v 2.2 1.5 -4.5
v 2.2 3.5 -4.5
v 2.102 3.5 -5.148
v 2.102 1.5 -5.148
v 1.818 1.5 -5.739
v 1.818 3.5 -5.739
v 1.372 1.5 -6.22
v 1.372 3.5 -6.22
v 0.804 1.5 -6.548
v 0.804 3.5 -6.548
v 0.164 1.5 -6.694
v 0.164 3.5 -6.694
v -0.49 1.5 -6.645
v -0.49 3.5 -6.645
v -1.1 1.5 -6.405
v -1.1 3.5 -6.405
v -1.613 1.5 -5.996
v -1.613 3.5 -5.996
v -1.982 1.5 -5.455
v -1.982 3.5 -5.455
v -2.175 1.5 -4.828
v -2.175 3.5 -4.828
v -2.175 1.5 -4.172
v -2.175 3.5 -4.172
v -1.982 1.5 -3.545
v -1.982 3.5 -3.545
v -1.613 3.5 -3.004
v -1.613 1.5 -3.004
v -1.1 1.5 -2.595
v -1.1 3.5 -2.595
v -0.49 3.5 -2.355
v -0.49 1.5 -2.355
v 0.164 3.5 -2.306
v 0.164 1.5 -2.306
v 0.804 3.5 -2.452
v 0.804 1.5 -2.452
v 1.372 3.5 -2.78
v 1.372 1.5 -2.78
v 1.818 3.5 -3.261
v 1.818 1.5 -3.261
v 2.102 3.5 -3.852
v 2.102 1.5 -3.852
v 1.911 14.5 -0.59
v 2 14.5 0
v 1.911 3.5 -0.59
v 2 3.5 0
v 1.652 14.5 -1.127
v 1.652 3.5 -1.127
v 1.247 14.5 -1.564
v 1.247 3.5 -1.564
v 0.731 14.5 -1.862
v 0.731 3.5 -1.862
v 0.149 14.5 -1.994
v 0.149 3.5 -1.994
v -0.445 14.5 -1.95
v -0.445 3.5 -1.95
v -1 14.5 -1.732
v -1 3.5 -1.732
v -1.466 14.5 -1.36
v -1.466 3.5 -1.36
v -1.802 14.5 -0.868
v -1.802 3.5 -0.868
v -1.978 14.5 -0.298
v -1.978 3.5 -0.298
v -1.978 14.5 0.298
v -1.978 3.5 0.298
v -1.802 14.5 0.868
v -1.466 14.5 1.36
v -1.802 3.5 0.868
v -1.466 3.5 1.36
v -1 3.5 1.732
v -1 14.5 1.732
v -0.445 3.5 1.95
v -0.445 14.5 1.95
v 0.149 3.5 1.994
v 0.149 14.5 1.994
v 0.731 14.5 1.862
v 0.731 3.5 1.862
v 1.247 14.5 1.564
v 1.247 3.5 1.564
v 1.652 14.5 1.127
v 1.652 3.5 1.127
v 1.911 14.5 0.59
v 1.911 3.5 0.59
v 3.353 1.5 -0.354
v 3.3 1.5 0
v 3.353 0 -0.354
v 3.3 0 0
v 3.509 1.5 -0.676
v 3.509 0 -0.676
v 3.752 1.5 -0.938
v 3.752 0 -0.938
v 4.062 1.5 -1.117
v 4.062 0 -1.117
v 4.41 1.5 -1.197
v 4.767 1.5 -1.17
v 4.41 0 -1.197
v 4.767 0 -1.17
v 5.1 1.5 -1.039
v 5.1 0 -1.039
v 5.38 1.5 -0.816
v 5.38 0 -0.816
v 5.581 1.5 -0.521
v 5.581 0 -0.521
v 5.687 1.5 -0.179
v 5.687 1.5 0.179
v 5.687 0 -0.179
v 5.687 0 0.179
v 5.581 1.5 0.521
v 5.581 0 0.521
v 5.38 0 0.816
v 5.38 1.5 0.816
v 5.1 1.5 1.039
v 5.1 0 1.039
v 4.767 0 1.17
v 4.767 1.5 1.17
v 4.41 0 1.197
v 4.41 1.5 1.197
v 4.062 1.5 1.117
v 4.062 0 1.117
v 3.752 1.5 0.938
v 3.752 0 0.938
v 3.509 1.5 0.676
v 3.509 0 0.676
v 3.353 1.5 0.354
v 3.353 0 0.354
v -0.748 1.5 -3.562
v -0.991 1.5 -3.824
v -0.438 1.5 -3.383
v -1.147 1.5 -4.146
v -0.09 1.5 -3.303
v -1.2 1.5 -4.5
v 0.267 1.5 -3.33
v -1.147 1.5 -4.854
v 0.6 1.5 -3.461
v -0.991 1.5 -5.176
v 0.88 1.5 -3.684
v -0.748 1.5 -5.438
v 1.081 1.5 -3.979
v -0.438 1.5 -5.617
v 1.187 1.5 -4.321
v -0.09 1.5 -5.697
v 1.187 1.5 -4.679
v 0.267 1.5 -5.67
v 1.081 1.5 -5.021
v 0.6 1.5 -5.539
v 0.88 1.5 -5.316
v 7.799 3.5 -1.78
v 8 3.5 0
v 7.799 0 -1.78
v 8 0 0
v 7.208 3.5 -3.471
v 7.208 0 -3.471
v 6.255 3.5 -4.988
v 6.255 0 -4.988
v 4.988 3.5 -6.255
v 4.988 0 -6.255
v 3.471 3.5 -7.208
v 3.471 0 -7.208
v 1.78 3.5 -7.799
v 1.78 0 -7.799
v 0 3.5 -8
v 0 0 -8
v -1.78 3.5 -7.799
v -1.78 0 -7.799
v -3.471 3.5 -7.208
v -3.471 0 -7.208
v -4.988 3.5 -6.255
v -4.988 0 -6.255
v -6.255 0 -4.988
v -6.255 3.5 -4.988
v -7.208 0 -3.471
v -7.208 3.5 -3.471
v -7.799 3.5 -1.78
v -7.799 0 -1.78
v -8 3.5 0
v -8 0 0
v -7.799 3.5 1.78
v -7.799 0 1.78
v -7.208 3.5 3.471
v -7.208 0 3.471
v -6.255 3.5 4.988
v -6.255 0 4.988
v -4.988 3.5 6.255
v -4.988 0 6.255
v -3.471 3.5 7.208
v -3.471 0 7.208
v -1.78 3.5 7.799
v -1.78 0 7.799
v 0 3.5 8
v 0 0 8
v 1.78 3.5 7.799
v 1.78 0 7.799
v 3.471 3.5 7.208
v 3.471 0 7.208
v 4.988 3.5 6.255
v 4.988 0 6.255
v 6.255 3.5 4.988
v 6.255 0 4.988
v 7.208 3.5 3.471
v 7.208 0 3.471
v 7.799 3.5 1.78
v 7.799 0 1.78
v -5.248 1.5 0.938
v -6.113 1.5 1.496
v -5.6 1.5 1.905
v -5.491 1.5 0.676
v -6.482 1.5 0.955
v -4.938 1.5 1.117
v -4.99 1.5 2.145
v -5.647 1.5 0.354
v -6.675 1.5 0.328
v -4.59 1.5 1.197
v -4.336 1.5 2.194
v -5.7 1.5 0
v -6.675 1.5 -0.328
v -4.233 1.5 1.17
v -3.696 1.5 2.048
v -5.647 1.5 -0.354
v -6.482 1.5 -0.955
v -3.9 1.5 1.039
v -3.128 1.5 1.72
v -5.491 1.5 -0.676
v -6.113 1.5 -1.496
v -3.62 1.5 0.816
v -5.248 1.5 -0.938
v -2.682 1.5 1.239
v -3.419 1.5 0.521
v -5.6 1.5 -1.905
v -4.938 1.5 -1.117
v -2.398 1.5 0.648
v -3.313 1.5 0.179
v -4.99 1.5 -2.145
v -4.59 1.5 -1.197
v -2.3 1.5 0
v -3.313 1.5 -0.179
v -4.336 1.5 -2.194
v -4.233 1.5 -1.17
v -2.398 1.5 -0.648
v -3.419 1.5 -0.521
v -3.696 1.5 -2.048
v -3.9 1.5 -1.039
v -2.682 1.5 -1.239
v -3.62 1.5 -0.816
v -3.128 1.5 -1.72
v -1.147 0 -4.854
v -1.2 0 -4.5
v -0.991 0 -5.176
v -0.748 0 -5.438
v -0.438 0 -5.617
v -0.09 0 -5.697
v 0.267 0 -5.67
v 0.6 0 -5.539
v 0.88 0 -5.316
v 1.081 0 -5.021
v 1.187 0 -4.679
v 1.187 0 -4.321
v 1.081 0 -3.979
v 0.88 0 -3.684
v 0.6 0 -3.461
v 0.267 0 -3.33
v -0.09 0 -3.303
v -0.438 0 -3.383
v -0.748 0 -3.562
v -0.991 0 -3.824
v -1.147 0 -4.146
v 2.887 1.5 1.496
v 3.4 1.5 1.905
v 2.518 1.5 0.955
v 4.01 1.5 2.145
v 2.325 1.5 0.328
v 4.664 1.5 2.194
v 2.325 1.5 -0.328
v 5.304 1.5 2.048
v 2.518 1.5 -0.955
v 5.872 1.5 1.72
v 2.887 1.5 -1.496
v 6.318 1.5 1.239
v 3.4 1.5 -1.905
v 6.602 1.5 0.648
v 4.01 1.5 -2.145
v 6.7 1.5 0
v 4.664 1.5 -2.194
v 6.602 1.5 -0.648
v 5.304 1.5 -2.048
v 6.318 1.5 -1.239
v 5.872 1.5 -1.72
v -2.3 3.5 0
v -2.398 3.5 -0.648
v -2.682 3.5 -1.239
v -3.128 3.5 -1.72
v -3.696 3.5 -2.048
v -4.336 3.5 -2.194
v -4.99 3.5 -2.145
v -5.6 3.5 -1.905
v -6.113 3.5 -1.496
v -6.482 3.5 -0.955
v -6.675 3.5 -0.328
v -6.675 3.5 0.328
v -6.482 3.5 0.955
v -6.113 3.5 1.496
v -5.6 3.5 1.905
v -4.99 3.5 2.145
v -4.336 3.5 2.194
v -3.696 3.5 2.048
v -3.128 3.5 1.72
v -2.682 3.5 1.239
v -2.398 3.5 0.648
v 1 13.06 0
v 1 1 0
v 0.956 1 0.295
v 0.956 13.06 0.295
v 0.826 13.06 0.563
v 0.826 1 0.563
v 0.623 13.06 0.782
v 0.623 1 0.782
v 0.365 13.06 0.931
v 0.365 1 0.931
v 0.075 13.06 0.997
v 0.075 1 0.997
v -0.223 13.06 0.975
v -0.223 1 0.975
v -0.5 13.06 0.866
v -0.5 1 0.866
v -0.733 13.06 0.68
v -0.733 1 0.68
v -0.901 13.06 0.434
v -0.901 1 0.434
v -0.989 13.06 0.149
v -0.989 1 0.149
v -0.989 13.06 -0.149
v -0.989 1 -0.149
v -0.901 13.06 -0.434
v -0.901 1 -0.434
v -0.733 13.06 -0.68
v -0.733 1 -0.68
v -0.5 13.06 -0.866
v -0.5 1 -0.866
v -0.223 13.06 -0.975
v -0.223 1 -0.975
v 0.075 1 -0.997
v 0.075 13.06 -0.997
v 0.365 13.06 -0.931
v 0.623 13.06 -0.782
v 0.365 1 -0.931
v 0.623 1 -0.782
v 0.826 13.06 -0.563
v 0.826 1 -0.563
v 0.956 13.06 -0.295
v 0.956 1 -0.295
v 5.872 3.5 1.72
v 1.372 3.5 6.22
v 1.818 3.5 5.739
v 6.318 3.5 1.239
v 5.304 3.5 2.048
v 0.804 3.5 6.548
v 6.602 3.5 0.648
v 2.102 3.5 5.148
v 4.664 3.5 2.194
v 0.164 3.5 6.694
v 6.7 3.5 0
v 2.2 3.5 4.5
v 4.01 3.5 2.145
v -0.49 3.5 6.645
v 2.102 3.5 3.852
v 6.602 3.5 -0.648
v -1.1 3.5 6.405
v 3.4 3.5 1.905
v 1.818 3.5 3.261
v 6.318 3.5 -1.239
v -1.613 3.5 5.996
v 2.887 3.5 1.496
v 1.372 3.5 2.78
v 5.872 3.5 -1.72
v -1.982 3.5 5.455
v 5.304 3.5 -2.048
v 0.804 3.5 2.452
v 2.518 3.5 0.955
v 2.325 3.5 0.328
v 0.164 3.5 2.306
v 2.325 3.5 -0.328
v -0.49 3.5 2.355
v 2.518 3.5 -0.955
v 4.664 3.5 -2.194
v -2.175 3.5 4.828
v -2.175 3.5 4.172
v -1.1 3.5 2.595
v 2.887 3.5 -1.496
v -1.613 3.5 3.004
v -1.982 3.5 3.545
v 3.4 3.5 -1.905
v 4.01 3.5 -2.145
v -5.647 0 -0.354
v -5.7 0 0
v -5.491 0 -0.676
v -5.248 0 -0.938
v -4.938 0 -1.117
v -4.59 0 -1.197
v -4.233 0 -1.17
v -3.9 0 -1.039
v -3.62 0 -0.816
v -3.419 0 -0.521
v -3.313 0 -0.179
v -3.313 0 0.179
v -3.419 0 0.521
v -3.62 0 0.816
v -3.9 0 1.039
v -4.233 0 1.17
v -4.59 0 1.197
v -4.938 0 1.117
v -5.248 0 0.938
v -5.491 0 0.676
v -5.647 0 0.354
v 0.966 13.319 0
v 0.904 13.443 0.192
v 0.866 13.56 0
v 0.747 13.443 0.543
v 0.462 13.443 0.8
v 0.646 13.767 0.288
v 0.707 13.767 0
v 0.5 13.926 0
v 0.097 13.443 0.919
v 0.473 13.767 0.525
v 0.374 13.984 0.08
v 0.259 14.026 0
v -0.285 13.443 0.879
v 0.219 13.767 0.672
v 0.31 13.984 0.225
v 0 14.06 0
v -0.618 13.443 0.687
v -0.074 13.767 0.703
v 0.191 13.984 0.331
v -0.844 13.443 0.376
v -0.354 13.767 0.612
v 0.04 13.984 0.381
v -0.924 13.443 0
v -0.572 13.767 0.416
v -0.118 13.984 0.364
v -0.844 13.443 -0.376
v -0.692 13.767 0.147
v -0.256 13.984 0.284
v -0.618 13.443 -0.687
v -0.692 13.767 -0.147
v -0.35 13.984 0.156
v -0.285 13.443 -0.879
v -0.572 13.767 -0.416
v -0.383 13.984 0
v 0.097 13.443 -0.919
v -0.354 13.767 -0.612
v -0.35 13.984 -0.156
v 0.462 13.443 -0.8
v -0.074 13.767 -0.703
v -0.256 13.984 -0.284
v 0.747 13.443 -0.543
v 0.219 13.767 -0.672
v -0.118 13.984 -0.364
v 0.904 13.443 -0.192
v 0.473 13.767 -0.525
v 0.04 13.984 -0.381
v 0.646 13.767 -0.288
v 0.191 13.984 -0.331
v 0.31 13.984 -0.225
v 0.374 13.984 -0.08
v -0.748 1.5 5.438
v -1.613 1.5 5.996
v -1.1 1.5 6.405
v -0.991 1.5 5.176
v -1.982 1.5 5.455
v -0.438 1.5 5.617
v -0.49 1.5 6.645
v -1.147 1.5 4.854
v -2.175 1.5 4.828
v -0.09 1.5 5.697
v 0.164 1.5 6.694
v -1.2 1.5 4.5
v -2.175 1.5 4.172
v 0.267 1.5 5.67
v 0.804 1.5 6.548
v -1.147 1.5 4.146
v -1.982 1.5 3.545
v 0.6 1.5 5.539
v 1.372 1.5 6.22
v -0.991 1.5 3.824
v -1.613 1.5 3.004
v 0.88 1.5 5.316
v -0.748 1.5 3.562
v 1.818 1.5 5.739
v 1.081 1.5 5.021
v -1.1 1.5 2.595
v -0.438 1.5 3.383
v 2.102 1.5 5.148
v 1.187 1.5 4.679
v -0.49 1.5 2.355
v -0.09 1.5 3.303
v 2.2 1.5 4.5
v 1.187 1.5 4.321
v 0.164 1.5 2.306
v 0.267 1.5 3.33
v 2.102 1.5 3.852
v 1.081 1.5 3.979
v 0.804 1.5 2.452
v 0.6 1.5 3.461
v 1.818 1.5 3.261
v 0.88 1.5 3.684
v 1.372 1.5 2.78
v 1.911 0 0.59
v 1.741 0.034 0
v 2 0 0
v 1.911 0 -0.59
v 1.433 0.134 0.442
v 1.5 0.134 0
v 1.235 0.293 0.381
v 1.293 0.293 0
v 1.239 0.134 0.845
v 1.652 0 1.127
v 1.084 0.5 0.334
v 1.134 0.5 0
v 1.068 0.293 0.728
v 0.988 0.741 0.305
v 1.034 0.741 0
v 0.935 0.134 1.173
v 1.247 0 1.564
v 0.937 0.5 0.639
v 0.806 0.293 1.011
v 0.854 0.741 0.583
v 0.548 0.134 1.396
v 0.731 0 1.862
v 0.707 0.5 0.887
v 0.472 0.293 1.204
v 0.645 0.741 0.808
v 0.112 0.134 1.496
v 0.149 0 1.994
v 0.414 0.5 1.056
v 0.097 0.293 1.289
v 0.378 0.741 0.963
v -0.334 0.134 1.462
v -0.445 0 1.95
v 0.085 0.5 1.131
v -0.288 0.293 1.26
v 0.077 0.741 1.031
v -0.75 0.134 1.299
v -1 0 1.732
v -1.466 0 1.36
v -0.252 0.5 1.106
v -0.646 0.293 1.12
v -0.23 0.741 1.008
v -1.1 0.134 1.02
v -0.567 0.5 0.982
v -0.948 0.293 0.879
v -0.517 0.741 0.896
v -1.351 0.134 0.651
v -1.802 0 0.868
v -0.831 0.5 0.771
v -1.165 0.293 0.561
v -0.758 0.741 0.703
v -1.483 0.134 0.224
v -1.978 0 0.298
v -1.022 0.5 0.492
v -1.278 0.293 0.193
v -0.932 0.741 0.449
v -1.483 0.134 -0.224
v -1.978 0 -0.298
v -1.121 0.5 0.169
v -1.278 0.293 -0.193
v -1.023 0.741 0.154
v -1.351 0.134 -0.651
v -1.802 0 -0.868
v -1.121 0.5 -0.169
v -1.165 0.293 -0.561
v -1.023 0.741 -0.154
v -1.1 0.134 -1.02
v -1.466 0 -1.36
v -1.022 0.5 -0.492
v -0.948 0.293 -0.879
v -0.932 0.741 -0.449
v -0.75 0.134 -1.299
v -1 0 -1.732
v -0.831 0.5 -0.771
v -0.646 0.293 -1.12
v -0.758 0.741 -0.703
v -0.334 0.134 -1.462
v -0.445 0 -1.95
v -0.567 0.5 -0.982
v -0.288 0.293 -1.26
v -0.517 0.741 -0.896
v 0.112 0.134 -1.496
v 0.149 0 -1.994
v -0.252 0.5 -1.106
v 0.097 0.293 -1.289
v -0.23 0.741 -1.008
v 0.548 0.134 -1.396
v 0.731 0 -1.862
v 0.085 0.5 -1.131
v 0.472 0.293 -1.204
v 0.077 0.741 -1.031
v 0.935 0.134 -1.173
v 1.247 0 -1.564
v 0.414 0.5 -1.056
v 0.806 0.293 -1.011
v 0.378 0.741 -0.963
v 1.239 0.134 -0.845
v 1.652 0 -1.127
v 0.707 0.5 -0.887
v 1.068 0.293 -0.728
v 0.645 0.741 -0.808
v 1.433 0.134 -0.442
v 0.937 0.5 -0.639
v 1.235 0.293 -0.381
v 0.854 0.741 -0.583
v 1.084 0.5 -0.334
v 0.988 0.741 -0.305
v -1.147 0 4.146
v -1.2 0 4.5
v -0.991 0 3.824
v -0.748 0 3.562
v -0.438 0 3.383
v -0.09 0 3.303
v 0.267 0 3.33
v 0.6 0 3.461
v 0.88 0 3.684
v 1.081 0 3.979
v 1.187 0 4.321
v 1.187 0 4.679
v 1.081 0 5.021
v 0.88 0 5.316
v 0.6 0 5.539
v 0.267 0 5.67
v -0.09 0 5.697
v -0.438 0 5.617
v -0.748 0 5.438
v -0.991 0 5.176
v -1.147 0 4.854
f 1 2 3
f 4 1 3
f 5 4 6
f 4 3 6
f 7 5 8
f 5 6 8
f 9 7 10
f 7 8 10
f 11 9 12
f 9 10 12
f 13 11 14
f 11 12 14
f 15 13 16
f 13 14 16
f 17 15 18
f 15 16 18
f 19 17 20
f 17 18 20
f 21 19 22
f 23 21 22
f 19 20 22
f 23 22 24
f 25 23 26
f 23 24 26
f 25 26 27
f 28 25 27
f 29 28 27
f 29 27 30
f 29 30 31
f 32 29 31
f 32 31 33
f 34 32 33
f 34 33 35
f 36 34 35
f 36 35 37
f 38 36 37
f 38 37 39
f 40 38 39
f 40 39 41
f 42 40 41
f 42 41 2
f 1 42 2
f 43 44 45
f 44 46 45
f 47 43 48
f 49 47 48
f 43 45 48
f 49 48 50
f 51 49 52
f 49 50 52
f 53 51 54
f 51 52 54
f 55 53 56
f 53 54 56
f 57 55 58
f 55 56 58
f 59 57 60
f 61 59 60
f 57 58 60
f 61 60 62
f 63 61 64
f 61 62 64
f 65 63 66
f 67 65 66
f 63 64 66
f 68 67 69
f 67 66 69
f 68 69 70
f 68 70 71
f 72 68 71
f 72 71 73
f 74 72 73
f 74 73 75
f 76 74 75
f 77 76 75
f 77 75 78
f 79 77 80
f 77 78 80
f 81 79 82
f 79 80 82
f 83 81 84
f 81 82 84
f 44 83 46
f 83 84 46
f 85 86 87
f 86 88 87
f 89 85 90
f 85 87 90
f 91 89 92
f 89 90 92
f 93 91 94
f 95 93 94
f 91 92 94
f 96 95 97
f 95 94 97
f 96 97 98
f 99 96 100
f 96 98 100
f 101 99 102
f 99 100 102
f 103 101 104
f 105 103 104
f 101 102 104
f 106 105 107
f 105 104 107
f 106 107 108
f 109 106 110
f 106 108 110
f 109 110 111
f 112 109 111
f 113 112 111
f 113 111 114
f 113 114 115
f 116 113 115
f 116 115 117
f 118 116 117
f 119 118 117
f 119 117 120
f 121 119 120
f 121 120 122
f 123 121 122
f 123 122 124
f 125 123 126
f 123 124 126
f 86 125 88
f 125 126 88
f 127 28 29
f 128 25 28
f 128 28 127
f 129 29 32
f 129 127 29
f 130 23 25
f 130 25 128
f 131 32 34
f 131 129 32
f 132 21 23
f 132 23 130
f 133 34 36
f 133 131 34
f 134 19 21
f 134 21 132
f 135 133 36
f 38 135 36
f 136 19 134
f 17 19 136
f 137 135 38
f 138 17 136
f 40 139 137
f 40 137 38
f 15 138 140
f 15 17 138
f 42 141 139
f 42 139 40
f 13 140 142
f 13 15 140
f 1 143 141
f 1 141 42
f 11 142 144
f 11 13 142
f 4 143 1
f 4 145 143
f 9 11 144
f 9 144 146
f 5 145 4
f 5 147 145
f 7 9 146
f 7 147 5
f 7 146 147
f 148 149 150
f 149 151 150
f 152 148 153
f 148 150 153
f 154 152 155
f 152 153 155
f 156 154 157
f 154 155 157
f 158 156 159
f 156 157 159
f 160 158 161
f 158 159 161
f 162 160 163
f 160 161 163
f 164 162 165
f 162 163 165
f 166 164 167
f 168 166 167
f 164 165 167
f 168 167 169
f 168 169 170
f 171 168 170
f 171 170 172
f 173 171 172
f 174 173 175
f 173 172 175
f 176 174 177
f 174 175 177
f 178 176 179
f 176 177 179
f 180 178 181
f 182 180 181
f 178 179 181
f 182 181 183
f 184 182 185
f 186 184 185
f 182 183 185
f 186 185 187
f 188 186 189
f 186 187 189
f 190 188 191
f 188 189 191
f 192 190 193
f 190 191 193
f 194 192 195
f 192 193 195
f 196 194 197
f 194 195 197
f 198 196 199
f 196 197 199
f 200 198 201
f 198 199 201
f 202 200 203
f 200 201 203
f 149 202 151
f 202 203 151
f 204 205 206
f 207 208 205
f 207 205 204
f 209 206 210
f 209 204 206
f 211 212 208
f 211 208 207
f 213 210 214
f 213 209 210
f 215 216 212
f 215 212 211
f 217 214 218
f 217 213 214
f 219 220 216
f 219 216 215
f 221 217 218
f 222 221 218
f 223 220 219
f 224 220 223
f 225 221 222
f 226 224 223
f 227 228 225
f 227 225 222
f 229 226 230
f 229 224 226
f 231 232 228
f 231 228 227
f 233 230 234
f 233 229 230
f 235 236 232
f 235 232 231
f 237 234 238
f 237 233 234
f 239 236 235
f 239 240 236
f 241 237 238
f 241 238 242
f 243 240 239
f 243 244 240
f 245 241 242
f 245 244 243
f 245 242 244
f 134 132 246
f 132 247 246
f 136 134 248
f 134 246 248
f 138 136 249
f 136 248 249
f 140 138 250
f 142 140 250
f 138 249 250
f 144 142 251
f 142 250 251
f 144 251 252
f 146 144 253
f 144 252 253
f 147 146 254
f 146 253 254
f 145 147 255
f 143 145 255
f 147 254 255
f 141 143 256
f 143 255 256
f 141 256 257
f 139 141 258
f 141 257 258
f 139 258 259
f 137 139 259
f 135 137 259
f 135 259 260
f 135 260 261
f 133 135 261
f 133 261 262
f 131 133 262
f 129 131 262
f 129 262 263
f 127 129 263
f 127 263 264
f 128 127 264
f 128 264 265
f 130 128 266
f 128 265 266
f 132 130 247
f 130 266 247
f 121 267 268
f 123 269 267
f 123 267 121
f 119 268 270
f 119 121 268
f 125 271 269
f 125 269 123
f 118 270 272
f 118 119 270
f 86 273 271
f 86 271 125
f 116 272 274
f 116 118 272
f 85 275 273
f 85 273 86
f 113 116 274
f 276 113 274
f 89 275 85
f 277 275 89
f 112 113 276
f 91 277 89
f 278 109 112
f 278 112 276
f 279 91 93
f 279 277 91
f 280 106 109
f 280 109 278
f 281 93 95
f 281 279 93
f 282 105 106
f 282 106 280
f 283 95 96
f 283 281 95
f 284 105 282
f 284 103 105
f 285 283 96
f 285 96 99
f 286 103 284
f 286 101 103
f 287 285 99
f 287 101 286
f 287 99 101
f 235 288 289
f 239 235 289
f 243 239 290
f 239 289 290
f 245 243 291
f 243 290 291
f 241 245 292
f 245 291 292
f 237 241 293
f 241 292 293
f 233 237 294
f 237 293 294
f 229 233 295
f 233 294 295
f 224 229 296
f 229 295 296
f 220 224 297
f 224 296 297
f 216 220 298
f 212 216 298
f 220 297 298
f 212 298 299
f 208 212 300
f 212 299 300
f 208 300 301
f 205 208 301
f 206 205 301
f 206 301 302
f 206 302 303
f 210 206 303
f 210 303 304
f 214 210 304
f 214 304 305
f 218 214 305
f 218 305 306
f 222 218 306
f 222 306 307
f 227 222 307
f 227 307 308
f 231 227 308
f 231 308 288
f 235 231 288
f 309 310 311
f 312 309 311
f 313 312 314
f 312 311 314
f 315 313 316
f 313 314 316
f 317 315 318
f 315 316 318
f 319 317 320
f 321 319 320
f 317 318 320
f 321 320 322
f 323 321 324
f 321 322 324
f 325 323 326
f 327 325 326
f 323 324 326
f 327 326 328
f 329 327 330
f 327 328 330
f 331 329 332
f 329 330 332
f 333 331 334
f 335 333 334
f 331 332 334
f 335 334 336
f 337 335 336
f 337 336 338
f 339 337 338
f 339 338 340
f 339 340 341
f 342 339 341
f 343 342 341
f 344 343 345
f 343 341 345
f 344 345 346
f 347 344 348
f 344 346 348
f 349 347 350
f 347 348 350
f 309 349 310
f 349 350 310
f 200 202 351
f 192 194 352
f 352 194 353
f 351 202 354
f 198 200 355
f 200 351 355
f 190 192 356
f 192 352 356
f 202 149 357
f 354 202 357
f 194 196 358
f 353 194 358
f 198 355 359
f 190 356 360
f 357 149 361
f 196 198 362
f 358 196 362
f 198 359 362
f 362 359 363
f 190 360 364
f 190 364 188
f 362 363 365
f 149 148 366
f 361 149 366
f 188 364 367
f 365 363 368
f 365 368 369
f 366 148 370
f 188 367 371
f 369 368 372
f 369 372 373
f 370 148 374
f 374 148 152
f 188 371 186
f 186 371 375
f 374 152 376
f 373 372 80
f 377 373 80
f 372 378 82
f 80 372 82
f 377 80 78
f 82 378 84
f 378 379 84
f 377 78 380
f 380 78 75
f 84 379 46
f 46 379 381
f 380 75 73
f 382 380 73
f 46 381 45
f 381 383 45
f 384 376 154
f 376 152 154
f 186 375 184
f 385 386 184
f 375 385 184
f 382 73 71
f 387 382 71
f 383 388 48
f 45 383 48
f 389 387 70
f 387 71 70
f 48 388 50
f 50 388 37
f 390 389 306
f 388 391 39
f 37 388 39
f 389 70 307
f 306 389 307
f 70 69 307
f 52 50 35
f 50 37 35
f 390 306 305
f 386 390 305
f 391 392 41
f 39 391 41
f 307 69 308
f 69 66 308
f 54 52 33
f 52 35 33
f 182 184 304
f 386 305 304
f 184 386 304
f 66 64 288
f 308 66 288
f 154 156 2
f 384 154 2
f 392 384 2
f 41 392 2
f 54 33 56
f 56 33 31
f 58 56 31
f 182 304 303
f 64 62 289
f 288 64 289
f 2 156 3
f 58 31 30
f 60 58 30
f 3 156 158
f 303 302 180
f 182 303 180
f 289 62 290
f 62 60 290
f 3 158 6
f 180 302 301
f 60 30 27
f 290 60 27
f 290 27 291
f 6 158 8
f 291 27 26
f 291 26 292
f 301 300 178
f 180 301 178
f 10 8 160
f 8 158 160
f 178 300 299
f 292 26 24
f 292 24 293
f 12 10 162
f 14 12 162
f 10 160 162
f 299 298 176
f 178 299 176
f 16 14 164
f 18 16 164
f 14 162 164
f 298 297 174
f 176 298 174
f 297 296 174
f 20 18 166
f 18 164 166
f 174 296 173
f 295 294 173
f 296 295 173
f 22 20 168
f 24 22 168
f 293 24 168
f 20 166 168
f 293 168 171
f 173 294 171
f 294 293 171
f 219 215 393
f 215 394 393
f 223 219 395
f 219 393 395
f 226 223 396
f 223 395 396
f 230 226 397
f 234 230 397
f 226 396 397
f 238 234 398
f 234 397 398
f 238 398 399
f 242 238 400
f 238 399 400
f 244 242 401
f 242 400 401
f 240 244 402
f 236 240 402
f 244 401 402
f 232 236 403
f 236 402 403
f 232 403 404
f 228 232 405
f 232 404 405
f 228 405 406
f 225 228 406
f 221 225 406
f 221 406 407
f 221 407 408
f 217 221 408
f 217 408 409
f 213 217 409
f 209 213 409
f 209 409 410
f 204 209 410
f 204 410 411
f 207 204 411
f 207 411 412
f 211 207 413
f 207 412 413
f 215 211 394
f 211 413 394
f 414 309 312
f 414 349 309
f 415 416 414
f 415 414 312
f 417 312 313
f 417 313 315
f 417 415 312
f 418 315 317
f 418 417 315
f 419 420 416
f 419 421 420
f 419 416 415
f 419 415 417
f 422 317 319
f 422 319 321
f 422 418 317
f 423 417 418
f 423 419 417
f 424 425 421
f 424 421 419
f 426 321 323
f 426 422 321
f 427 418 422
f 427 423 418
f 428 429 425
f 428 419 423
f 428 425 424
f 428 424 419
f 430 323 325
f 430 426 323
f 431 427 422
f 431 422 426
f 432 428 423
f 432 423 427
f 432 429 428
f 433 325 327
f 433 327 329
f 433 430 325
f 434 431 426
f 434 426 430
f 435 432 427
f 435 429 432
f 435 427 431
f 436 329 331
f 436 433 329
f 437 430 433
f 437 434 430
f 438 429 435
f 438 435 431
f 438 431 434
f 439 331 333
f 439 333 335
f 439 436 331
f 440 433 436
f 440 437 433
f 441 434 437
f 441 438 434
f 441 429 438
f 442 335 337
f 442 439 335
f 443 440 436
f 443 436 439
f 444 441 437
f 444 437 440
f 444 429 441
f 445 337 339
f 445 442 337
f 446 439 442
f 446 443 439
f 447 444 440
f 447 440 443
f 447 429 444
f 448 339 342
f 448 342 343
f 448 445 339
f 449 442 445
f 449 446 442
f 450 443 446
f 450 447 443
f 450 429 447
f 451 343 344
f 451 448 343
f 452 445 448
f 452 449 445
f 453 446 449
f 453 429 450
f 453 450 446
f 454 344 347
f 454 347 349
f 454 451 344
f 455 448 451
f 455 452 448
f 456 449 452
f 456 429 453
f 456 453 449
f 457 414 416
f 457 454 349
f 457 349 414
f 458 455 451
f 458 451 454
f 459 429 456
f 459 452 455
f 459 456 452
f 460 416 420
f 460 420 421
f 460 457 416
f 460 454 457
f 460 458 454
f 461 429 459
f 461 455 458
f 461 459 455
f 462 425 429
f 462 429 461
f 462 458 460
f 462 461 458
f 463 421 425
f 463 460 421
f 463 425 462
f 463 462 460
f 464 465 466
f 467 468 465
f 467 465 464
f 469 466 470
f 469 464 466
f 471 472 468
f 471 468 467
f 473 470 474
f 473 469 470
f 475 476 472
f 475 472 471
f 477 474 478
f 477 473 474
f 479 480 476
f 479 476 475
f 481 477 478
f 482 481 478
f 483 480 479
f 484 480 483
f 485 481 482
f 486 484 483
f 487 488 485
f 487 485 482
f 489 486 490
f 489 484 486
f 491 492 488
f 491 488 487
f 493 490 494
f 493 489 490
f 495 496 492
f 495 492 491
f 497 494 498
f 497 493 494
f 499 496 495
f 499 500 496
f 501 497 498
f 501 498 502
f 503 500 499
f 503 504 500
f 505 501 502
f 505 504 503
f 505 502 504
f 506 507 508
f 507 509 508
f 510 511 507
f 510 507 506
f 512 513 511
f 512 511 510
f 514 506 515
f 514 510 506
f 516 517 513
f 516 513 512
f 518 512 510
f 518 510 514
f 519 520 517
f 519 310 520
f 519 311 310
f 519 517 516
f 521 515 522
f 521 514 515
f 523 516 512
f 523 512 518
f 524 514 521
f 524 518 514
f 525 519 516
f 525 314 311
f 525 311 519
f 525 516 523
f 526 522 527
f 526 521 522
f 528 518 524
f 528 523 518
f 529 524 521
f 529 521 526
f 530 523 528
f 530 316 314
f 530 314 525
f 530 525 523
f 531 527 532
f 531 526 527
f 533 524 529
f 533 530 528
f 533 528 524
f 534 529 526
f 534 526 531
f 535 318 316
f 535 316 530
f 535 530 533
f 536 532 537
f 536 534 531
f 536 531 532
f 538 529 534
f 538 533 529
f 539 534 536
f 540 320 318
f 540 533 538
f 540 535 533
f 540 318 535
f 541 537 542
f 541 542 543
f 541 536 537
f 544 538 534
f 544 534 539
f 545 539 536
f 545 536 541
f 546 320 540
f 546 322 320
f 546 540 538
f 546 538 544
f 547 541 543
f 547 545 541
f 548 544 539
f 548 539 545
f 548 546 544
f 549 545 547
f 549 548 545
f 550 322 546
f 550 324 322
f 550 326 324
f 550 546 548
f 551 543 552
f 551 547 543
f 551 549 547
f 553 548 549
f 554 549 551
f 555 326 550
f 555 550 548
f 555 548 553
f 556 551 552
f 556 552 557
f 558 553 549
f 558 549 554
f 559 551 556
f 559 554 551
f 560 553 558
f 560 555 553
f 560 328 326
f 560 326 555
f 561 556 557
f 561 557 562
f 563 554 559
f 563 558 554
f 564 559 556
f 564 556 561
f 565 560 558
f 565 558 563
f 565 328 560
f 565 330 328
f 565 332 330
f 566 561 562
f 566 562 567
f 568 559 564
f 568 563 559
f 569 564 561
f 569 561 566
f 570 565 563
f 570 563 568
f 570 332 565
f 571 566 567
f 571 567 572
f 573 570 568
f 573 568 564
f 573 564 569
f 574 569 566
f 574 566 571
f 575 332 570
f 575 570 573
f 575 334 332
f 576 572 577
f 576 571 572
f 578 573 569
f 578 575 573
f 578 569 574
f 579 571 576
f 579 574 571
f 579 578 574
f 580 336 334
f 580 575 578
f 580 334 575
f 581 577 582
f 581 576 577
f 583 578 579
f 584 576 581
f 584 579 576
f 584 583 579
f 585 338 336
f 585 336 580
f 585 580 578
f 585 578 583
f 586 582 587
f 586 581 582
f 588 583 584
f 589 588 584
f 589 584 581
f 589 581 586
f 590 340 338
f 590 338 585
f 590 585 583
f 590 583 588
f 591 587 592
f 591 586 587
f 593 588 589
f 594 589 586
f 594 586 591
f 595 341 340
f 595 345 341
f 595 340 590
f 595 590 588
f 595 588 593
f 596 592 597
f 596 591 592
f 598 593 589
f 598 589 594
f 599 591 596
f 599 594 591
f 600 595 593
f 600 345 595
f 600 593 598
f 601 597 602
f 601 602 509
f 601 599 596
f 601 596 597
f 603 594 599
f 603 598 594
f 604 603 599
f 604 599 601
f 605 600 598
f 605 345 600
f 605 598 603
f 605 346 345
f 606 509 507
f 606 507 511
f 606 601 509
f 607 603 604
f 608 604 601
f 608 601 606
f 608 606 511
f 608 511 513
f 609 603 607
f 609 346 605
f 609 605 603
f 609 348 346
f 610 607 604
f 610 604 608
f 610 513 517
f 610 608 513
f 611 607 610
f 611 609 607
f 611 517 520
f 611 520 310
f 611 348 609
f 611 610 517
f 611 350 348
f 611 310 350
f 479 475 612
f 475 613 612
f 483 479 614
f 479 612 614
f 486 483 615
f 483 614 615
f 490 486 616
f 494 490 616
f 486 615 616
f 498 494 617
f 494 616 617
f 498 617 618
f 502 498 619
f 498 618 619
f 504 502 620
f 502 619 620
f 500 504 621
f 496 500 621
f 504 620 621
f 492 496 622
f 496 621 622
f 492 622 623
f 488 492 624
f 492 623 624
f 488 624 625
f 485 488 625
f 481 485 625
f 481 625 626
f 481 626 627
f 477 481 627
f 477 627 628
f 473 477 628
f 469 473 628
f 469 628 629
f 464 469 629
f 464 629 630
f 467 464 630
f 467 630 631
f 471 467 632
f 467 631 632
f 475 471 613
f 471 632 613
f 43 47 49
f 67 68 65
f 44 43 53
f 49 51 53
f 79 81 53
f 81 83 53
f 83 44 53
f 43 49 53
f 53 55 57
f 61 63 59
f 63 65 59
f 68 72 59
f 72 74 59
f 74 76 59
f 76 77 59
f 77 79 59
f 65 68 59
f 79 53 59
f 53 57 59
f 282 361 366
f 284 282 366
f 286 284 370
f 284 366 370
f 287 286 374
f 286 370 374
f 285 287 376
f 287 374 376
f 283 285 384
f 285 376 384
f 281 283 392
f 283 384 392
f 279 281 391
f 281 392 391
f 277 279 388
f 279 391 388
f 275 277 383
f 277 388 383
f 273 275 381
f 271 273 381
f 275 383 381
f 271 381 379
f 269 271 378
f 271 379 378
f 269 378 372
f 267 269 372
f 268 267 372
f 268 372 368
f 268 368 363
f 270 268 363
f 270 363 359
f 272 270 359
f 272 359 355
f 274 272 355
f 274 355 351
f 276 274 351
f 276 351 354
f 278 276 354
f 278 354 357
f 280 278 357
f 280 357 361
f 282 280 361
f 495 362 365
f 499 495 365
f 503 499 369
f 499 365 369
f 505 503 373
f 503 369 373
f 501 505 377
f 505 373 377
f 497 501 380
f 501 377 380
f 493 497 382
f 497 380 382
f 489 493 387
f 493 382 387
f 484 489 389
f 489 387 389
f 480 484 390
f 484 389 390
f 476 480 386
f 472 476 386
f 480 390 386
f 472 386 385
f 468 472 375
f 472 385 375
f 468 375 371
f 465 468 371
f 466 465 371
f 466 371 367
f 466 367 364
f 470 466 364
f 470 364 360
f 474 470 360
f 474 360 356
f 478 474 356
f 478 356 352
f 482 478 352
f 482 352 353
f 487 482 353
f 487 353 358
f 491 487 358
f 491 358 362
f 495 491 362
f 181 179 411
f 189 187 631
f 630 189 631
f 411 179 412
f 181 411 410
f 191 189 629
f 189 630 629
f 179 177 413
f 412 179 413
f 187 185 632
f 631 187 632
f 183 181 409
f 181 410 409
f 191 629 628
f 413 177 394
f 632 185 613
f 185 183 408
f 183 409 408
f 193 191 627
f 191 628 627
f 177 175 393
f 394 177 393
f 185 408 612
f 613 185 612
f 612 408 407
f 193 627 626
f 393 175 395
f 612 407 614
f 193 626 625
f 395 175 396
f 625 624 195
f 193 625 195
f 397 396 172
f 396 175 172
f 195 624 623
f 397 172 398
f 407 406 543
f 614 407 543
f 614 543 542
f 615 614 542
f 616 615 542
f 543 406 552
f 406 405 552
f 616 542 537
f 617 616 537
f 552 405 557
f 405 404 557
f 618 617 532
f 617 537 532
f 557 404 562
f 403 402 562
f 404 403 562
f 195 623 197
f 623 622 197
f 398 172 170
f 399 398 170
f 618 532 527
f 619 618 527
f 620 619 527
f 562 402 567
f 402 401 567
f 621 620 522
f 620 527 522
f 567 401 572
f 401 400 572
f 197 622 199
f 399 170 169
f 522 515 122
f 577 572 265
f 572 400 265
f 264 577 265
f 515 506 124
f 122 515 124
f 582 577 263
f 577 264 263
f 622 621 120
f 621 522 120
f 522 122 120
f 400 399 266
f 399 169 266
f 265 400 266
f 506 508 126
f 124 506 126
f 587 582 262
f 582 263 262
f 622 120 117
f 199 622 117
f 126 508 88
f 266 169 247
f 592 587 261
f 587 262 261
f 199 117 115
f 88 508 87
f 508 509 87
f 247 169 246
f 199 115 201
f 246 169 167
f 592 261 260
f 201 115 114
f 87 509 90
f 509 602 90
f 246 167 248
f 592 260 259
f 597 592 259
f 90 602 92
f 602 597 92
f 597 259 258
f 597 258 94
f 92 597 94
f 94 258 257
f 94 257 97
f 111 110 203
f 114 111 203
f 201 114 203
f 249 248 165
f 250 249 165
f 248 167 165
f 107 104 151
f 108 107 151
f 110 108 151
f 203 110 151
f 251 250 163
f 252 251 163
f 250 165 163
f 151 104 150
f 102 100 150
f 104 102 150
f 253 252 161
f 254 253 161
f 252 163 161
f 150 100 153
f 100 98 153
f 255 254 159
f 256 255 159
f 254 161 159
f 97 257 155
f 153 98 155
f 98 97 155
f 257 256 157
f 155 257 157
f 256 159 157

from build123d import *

# Parameters (mm, degrees)
CBORE_FOR_M2_SHCS1_D           = 2.4
CBORE_FOR_M2_SHCS1_CBORE_D     = 4.4
CBORE_FOR_M2_SHCS1_CBORE_DEPTH = 2
SKETCH8_R                      = 1
CUT_EXTRUDE1_DEPTH             = 14.06
FILLET1_R                      = 1


with BuildPart() as part:
    # Sketch3 → Revolve1 (revolve)
    with BuildSketch(Plane.XY):
        Polygon((0, 0), (0, 14.5), (2, 14.5), (2, 3.5), (8, 3.5), (8, 0), align=None)
    revolve(axis=Axis((0, 0, 0), (0, 1, 0)))

    # CBORE for M2 SHCS1 (through all)
    with Locations(Plane(origin=(0, 3.5, 0), x_dir=(1, 0, 0), z_dir=(0, 1, 0))):
        with Locations((-4.5, 0), (0, 4.5), (4.5, 0), (0, -4.5)):
            CounterBoreHole(CBORE_FOR_M2_SHCS1_D / 2, CBORE_FOR_M2_SHCS1_CBORE_D / 2, CBORE_FOR_M2_SHCS1_CBORE_DEPTH)

    # Sketch8 → Cut-Extrude1 (cut)
    with BuildSketch(Plane.XZ):
        Circle(SKETCH8_R)
    extrude(amount=-CUT_EXTRUDE1_DEPTH, mode=Mode.SUBTRACT)

    # Fillet1
    fillet1_edges = [part.edges().sort_by_distance(p)[0] for p in [
        (-1, 14.06, 0),
        (-1, 0, 0),
    ]]
    fillet(fillet1_edges, radius=FILLET1_R)


solid = part.part
